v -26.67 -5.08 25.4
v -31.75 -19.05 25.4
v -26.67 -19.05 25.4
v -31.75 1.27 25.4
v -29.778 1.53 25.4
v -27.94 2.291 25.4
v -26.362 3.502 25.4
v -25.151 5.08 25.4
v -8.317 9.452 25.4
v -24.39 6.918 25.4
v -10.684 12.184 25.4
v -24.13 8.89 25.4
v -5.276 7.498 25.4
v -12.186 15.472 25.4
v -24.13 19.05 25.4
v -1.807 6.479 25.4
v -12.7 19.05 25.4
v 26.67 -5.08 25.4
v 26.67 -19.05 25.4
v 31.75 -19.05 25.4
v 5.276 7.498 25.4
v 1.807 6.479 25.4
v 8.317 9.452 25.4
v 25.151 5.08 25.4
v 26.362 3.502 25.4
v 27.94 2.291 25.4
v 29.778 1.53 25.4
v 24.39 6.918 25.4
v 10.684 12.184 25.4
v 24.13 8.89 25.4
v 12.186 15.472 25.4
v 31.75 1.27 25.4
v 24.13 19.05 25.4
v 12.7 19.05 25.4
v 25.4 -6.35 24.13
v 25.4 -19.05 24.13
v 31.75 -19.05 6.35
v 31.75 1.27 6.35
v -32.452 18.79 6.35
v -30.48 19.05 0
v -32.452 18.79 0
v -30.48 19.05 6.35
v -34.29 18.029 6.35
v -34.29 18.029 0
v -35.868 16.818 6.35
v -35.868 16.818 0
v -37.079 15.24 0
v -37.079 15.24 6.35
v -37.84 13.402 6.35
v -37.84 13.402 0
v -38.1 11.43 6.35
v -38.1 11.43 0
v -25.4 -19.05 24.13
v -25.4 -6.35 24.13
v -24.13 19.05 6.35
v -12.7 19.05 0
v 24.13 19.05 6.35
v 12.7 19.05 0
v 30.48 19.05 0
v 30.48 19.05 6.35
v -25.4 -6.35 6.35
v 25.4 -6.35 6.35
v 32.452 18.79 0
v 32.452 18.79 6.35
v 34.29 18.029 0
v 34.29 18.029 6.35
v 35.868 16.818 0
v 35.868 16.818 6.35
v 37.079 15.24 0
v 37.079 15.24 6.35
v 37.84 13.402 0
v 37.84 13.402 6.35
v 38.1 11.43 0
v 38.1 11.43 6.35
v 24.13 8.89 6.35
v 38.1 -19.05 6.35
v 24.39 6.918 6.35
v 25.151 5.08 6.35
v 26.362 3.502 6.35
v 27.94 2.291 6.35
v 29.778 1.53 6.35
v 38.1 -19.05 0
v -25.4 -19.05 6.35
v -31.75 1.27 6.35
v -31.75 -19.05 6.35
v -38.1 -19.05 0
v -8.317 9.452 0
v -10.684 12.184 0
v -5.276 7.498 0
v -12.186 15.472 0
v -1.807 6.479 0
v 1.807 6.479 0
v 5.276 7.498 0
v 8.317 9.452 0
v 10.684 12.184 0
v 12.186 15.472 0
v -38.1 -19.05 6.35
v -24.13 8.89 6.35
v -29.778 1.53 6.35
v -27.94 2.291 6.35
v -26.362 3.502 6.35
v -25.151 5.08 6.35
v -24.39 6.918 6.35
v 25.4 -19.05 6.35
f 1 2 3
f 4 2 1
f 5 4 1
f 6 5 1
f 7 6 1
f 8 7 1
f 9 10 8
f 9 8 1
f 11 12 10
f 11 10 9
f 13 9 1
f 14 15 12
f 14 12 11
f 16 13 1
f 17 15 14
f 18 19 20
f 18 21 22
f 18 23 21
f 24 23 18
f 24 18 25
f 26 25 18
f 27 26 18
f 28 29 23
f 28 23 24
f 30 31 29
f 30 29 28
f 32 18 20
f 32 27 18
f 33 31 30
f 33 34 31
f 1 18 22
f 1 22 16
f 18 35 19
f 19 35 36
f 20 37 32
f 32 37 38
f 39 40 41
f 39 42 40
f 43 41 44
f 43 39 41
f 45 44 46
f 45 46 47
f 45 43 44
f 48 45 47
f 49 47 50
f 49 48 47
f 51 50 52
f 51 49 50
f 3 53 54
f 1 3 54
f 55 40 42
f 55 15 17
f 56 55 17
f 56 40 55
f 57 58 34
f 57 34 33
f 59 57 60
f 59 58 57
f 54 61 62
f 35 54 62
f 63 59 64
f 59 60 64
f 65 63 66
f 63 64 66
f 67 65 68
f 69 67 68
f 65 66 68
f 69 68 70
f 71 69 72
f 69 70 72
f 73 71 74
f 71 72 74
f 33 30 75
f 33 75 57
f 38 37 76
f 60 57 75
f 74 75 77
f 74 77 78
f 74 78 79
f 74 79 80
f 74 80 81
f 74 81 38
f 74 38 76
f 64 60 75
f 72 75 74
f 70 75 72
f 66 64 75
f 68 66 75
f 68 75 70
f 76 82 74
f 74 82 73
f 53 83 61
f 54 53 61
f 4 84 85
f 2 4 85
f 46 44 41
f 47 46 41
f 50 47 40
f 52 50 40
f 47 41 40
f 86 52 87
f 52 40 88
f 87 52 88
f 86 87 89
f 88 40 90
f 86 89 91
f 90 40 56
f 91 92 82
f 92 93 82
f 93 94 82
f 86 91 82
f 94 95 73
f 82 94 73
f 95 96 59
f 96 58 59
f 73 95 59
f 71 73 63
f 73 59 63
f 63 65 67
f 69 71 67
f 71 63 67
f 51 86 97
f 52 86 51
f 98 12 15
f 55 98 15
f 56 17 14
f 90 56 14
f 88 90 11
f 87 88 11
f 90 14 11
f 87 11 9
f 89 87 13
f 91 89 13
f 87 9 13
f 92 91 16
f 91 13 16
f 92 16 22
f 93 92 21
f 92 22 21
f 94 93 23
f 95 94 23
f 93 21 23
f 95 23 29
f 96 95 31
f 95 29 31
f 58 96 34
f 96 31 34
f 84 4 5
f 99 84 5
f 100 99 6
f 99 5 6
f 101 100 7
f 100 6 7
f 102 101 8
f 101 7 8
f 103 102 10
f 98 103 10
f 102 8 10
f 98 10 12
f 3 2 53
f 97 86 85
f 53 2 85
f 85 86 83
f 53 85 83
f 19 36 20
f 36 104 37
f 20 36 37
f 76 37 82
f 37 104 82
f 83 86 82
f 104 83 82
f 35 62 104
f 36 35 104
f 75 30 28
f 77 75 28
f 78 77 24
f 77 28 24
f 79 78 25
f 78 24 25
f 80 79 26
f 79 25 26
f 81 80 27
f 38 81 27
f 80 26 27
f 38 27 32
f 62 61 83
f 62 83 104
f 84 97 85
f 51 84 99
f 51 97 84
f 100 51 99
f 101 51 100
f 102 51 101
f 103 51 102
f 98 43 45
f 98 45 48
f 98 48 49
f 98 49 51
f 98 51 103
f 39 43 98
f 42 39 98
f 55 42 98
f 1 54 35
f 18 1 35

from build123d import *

# Parameters (mm, degrees)
F0_W     = 76.2
F0_H     = 38.1
F1_DEPTH = 6.35
F3_DEPTH = 19.05
F5_DEPTH = 25.401
F6_W     = 7.62
F6_H     = 10.16
F7_DEPTH = 19.05
F8_SIZE  = 1.27
F9_R     = 7.62


with BuildPart() as f1:
    # F0 (on Top) → F1 (new body)
    with BuildSketch(Plane.XY):
        Rectangle(F0_W, F0_H)
    extrude(amount=F1_DEPTH)

    # F2 (on face) → F3 (join)
    with BuildSketch(Plane.XY.offset(6.35)):
        Polygon((31.75, 19.05), (-31.75, 19.05), (-31.75, -19.05), (-25.4, -19.05), (-25.4, -6.35), (25.4, -6.35), (25.4, -19.05), (31.75, -19.05), align=None)
    extrude(amount=F3_DEPTH)

    # F4 (on face) → F5 (cut, through all)
    with BuildSketch(Plane.XY.offset(25.4)):
        with BuildLine():
            ThreePointArc((-12.7, 19.05), (0, 6.35), (12.7, 19.05))
            Line((12.7, 19.05), (-12.7, 19.05))
        make_face()
    extrude(amount=-F5_DEPTH, mode=Mode.SUBTRACT)

    # F6 (on face) → F7 (cut, through all)
    with BuildSketch(Plane.XY.offset(25.4)):
        with BuildLine():
            Line((31.75, 1.27), (31.75, 8.89))
            Line((31.75, 8.89), (24.13, 8.89))
            ThreePointArc((24.13, 8.89), (26.3618463274, 3.5018463274), (31.75, 1.27))
        make_face()
        with Locations((27.94, 13.97)):
            Rectangle(F6_W, F6_H)
        with BuildLine():
            Line((-24.13, 8.89), (-24.13, 19.05))
            Line((-24.13, 19.05), (-31.75, 19.05))
            Line((-31.75, 19.05), (-31.75, 1.27))
            ThreePointArc((-31.75, 1.27), (-26.3618463274, 3.5018463274), (-24.13, 8.89))
        make_face()
    extrude(amount=-F7_DEPTH, mode=Mode.SUBTRACT)

    # F8
    f8_edges = [f1.edges().sort_by_distance(p)[0] for p in [
        (-25.4, -12.7, 25.4),
        (0, -6.35, 25.4),
        (25.4, -12.7, 25.4),
    ]]
    chamfer(f8_edges, length=F8_SIZE)

    # F9
    f9_edges = [f1.edges().sort_by_distance(p)[0] for p in [
        (-38.1, 19.05, 3.175),
        (38.1, 19.05, 3.175),
    ]]
    fillet(f9_edges, radius=F9_R)


solid = f1.part
